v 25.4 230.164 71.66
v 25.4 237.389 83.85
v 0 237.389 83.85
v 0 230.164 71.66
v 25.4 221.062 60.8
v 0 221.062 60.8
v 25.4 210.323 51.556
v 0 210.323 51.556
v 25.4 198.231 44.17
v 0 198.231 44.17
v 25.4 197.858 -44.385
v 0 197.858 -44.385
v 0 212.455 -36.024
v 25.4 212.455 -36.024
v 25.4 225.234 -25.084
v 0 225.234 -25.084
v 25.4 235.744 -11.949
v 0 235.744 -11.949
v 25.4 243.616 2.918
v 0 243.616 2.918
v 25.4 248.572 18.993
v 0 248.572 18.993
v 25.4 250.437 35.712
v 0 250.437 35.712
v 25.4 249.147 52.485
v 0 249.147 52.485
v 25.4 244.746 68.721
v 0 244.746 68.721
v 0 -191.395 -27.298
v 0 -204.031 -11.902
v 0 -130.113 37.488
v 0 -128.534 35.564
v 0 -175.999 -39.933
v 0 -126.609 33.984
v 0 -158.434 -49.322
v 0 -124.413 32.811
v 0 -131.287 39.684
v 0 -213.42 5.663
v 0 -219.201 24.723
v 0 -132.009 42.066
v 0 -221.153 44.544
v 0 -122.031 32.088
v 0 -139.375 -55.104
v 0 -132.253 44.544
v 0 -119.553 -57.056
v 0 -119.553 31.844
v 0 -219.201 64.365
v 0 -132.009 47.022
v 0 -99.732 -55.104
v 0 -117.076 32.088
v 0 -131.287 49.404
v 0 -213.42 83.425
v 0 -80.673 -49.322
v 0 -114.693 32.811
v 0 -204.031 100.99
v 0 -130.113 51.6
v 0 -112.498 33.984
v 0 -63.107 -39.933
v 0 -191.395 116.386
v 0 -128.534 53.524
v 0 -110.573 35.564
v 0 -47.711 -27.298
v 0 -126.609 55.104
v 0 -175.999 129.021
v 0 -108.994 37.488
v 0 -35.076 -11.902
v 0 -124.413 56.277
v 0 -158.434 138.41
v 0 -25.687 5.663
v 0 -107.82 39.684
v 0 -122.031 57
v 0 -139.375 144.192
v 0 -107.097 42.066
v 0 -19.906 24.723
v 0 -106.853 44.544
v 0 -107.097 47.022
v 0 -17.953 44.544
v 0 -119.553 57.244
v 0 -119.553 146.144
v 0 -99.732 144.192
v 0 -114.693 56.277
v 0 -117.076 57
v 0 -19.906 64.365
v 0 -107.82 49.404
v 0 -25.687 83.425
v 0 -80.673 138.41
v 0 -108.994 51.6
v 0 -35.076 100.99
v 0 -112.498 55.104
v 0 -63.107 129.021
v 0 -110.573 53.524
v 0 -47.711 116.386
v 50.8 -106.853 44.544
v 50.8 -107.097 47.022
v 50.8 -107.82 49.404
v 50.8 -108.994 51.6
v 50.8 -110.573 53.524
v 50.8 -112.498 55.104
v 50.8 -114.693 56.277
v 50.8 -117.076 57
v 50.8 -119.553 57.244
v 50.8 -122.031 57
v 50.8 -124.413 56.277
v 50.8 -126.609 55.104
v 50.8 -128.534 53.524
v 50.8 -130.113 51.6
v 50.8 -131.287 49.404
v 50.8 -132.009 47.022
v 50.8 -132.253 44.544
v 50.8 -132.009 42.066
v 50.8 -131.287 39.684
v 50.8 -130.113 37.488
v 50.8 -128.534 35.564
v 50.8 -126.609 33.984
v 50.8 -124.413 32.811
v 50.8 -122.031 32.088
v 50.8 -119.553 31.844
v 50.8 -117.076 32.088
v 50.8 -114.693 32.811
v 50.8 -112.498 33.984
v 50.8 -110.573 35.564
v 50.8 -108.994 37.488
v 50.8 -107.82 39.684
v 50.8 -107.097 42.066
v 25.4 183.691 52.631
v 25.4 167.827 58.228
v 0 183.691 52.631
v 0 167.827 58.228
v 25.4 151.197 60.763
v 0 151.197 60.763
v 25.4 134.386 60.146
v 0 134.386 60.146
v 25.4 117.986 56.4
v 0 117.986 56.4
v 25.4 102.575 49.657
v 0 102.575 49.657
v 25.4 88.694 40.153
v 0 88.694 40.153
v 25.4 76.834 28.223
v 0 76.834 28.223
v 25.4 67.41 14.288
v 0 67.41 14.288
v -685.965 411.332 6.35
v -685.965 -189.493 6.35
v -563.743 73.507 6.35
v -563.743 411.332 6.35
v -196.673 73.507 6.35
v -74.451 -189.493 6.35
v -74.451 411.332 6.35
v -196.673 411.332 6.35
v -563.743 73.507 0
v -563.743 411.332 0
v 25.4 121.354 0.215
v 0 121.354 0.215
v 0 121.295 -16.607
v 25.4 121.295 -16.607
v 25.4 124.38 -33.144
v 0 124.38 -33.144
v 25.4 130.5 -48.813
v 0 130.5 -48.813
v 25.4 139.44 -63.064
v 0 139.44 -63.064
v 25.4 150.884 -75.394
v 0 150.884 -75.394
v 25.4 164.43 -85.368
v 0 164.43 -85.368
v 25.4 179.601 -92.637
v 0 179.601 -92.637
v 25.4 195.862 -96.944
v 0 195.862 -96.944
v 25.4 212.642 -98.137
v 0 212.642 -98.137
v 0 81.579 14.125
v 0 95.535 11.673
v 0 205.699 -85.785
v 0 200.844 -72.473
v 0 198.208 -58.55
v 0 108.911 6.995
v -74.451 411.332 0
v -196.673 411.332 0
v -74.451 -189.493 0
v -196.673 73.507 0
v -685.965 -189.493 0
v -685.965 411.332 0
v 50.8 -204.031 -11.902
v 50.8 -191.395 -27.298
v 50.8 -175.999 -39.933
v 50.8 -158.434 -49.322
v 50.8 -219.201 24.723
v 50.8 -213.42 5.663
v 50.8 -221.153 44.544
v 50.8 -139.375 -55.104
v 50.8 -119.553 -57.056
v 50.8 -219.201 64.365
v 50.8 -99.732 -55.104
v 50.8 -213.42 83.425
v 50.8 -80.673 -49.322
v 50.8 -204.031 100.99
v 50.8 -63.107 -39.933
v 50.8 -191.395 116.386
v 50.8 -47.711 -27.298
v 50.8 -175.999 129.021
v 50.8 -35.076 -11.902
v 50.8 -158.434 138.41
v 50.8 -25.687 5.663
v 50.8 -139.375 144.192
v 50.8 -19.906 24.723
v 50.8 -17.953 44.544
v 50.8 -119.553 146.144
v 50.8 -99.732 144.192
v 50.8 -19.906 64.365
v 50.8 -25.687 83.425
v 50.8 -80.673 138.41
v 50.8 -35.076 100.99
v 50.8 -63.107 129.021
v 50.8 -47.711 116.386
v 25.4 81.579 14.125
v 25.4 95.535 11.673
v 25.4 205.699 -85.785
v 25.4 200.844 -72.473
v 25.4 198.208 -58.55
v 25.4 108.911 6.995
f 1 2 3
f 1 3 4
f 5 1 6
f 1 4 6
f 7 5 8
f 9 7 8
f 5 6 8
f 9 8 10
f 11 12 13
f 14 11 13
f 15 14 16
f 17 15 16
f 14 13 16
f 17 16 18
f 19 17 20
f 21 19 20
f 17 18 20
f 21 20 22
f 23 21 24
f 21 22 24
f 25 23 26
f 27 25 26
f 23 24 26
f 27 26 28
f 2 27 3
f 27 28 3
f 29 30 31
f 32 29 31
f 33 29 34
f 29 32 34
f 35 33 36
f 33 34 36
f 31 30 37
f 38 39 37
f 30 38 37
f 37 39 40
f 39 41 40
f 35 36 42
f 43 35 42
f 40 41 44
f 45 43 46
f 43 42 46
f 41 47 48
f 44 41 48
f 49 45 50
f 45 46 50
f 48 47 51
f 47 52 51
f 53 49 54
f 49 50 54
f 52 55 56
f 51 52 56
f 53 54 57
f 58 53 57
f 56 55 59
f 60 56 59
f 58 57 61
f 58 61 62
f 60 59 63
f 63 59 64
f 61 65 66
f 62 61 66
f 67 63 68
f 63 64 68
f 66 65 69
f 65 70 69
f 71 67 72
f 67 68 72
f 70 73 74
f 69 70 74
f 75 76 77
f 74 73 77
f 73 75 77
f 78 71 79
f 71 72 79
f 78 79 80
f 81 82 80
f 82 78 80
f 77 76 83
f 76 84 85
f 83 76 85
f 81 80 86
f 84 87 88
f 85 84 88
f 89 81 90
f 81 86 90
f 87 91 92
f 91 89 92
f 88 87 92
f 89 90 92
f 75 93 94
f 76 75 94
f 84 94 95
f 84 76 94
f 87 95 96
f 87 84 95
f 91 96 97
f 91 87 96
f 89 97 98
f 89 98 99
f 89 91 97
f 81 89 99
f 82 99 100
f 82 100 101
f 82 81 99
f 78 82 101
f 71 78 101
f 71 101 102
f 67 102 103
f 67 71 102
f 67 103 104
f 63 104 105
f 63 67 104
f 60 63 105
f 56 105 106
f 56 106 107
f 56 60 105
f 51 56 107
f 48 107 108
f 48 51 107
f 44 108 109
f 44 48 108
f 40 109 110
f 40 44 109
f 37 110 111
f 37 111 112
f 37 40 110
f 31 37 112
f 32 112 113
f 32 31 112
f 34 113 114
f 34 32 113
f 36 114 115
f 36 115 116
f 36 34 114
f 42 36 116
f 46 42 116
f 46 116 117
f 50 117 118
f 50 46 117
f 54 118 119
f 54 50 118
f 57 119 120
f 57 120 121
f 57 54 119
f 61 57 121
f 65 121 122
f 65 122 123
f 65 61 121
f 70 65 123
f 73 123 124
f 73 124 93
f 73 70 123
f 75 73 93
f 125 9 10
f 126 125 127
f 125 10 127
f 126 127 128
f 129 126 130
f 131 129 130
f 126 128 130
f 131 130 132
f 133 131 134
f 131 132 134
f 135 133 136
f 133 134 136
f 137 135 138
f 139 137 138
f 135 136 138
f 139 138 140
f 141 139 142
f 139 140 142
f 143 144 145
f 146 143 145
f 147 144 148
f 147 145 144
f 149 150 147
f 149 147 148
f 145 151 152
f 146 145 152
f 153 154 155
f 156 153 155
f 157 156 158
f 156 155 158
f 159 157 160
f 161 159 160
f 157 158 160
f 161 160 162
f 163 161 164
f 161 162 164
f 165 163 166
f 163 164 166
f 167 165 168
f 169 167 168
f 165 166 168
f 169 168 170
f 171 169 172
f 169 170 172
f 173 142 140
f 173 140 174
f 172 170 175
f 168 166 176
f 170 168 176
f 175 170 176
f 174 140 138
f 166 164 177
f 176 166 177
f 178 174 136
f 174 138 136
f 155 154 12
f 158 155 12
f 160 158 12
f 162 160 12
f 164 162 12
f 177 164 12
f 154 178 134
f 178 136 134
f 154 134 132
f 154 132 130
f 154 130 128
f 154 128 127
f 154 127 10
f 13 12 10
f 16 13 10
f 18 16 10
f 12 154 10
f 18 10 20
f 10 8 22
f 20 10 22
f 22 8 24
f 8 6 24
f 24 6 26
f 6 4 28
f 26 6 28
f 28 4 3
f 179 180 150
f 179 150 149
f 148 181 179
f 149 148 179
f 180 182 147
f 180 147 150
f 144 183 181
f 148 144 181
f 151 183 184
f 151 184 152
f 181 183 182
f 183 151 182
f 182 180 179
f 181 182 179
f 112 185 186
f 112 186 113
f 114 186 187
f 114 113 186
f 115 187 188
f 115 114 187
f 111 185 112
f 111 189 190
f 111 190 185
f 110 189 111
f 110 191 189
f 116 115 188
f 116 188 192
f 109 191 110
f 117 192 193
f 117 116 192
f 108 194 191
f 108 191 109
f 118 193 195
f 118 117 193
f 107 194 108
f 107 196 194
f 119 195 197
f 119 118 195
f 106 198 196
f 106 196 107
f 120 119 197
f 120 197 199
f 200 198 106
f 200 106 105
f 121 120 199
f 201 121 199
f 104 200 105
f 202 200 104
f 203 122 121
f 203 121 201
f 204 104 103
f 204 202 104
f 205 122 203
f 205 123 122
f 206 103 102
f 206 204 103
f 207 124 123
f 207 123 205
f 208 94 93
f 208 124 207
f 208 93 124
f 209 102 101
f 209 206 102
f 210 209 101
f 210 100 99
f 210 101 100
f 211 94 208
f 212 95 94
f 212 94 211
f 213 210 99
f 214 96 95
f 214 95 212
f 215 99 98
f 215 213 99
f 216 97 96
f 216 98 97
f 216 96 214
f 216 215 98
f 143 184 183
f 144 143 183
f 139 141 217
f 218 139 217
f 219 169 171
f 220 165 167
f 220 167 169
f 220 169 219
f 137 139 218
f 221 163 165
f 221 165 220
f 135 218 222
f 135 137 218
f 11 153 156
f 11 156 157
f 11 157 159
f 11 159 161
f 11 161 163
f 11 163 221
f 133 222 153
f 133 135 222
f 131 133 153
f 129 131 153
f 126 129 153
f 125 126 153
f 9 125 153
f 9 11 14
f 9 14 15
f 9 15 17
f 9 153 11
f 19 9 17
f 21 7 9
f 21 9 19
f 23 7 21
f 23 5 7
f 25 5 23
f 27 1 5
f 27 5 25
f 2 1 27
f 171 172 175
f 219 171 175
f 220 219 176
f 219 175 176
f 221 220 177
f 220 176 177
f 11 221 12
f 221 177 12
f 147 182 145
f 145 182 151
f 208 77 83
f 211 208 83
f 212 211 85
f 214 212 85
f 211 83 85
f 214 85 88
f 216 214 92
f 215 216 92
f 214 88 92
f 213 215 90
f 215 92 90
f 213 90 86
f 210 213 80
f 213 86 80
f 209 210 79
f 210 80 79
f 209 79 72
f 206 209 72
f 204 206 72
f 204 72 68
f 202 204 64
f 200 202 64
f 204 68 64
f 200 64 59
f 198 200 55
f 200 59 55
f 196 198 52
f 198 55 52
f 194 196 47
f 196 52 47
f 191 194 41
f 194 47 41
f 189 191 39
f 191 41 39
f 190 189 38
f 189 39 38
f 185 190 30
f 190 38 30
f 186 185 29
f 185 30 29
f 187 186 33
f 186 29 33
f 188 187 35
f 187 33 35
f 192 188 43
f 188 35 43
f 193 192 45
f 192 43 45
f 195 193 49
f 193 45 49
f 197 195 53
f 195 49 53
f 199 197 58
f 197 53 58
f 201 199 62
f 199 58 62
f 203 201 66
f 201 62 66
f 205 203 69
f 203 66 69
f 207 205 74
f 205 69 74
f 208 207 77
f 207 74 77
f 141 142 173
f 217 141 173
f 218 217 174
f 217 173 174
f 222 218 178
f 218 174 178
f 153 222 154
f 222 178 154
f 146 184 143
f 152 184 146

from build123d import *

# Parameters (mm, degrees)
F0_R          = 9.9695
F0_R_2        = 3.175
F1_DEPTH      = 12.7
F3_ANGLE      = 55
F5_DEPTH      = 25.4
F6_W          = 12.7015647013
F6_H          = 11.3607975654
F7_ANGLE_BACK = 20
F7_ANGLE      = 35
F9_R          = 101.6
F9_R_2        = 12.7
F10_DEPTH     = 50.8
F12_DEPTH     = 25.4
F13_W         = 122.2220659256
F13_H         = 337.8250226378
F14_DEPTH     = 6.35


with BuildPart() as f1:
    # F0 (on Right) → F1 (new body)
    with BuildSketch(Plane.YZ):
        Circle(F0_R)
        Circle(F0_R_2, mode=Mode.SUBTRACT)
    extrude(amount=F1_DEPTH)

    # F2 (on Front) → F3 (revolve)
    with BuildSketch(Plane.XZ):
        Polygon((0, 3.1384535633), (12.7009730786, 3.1384535633), (12.7009730786, 15.4148072024), (9.402487427, 15.4148072024), (9.402487427, 5.549292734), (3.5090376623, 5.549292734), (3.5090376623, 15.4148072024), (0, 15.4148072024), align=None)
    revolve(axis=Axis((6.3504865393, 0, 0), (1, 0, 0)), revolution_arc=F3_ANGLE)

    # F4 (on face) → F5 (cut)
    with BuildSketch(Plane(origin=(0, 0, 0), x_dir=(0, -1, 0), z_dir=(-1, 0, 0))):
        with BuildLine():
            ThreePointArc((0, 9.9695), (6.2088830117, 11.9271532939), (8.1665363055, 5.7182702822))
            Line((8.1665363055, 5.7182702822), (12.6270708322, 8.8415701822))
            ThreePointArc((12.6270708322, 8.8415701822), (7.117765849, 13.6731009799), (0, 15.4148072024))
            Line((0, 15.4148072024), (0, 9.9695))
        make_face()
    extrude(amount=-F5_DEPTH, mode=Mode.SUBTRACT)

    # F6 (on Front) → F7 (revolve)
    with BuildSketch(Plane.XZ, mode=Mode.PRIVATE) as f7_sk:
        with Locations((6.3507823506, -8.9246716816)):
            Rectangle(F6_W, F6_H)
    revolve(f7_sk.sketch.rotate(Axis((6.3462648541, 0, 0), (1, 0, 0)), -F7_ANGLE_BACK), axis=Axis((6.3462648541, 0, 0), (1, 0, 0)), revolution_arc=F7_ANGLE)


with BuildPart() as f10:
    # F9 (on Right) → F10 (new body)
    with BuildSketch(Plane.YZ):
        with Locations((-119.5533797145, 44.544018805)):
            Circle(F9_R)
        with Locations((-119.5533797145, 44.544018805)):
            Circle(F9_R_2, mode=Mode.SUBTRACT)
    extrude(amount=F10_DEPTH)


with BuildPart() as f12:
    # F11 (on Right) → F12 (new body)
    with BuildSketch(Plane.YZ):
        with BuildLine():
            ThreePointArc((237.3891258137, 83.8495728722), (221.0619489228, 60.800243837), (198.2306007051, 44.1696150828))
            ThreePointArc((198.2306007051, 44.1696150828), (126.0980894407, 58.6587827449), (67.410454154, 14.2876589671))
            ThreePointArc((67.410454154, 14.2876589671), (95.5353470841, 11.672573525), (121.353568175, 0.2153603429))
            ThreePointArc((121.353568175, 0.2153603429), (144.8718365321, -69.4978106819), (212.6421745615, -98.1372318392))
            ThreePointArc((212.6421745615, -98.1372318392), (200.8444585224, -72.472817362), (197.8575856492, -44.3849754257))
            ThreePointArc((197.8575856492, -44.3849754257), (246.4718285565, 10.839027937), (237.3891258137, 83.8495728722))
        make_face()
    extrude(amount=F12_DEPTH)


with BuildPart() as f14:
    # F13 (on Top) → F14 (new body)
    with BuildSketch(Plane.XY):
        Polygon((-685.9648823738, -189.4927024841), (-74.4511634111, -189.4927024841), (-74.4511634111, 73.5066011548), (-196.6732293367, 73.5066011548), (-563.7428164482, 73.5066011548), (-685.9648823738, 73.5066011548), align=None)
        with Locations((-135.5621963739, 242.4191124737)):
            Rectangle(F13_W, F13_H)
        with Locations((-624.853849411, 242.4191124737)):
            Rectangle(F13_W, F13_H)
    extrude(amount=F14_DEPTH)


solid = Compound([f10.part, f12.part, f14.part])
